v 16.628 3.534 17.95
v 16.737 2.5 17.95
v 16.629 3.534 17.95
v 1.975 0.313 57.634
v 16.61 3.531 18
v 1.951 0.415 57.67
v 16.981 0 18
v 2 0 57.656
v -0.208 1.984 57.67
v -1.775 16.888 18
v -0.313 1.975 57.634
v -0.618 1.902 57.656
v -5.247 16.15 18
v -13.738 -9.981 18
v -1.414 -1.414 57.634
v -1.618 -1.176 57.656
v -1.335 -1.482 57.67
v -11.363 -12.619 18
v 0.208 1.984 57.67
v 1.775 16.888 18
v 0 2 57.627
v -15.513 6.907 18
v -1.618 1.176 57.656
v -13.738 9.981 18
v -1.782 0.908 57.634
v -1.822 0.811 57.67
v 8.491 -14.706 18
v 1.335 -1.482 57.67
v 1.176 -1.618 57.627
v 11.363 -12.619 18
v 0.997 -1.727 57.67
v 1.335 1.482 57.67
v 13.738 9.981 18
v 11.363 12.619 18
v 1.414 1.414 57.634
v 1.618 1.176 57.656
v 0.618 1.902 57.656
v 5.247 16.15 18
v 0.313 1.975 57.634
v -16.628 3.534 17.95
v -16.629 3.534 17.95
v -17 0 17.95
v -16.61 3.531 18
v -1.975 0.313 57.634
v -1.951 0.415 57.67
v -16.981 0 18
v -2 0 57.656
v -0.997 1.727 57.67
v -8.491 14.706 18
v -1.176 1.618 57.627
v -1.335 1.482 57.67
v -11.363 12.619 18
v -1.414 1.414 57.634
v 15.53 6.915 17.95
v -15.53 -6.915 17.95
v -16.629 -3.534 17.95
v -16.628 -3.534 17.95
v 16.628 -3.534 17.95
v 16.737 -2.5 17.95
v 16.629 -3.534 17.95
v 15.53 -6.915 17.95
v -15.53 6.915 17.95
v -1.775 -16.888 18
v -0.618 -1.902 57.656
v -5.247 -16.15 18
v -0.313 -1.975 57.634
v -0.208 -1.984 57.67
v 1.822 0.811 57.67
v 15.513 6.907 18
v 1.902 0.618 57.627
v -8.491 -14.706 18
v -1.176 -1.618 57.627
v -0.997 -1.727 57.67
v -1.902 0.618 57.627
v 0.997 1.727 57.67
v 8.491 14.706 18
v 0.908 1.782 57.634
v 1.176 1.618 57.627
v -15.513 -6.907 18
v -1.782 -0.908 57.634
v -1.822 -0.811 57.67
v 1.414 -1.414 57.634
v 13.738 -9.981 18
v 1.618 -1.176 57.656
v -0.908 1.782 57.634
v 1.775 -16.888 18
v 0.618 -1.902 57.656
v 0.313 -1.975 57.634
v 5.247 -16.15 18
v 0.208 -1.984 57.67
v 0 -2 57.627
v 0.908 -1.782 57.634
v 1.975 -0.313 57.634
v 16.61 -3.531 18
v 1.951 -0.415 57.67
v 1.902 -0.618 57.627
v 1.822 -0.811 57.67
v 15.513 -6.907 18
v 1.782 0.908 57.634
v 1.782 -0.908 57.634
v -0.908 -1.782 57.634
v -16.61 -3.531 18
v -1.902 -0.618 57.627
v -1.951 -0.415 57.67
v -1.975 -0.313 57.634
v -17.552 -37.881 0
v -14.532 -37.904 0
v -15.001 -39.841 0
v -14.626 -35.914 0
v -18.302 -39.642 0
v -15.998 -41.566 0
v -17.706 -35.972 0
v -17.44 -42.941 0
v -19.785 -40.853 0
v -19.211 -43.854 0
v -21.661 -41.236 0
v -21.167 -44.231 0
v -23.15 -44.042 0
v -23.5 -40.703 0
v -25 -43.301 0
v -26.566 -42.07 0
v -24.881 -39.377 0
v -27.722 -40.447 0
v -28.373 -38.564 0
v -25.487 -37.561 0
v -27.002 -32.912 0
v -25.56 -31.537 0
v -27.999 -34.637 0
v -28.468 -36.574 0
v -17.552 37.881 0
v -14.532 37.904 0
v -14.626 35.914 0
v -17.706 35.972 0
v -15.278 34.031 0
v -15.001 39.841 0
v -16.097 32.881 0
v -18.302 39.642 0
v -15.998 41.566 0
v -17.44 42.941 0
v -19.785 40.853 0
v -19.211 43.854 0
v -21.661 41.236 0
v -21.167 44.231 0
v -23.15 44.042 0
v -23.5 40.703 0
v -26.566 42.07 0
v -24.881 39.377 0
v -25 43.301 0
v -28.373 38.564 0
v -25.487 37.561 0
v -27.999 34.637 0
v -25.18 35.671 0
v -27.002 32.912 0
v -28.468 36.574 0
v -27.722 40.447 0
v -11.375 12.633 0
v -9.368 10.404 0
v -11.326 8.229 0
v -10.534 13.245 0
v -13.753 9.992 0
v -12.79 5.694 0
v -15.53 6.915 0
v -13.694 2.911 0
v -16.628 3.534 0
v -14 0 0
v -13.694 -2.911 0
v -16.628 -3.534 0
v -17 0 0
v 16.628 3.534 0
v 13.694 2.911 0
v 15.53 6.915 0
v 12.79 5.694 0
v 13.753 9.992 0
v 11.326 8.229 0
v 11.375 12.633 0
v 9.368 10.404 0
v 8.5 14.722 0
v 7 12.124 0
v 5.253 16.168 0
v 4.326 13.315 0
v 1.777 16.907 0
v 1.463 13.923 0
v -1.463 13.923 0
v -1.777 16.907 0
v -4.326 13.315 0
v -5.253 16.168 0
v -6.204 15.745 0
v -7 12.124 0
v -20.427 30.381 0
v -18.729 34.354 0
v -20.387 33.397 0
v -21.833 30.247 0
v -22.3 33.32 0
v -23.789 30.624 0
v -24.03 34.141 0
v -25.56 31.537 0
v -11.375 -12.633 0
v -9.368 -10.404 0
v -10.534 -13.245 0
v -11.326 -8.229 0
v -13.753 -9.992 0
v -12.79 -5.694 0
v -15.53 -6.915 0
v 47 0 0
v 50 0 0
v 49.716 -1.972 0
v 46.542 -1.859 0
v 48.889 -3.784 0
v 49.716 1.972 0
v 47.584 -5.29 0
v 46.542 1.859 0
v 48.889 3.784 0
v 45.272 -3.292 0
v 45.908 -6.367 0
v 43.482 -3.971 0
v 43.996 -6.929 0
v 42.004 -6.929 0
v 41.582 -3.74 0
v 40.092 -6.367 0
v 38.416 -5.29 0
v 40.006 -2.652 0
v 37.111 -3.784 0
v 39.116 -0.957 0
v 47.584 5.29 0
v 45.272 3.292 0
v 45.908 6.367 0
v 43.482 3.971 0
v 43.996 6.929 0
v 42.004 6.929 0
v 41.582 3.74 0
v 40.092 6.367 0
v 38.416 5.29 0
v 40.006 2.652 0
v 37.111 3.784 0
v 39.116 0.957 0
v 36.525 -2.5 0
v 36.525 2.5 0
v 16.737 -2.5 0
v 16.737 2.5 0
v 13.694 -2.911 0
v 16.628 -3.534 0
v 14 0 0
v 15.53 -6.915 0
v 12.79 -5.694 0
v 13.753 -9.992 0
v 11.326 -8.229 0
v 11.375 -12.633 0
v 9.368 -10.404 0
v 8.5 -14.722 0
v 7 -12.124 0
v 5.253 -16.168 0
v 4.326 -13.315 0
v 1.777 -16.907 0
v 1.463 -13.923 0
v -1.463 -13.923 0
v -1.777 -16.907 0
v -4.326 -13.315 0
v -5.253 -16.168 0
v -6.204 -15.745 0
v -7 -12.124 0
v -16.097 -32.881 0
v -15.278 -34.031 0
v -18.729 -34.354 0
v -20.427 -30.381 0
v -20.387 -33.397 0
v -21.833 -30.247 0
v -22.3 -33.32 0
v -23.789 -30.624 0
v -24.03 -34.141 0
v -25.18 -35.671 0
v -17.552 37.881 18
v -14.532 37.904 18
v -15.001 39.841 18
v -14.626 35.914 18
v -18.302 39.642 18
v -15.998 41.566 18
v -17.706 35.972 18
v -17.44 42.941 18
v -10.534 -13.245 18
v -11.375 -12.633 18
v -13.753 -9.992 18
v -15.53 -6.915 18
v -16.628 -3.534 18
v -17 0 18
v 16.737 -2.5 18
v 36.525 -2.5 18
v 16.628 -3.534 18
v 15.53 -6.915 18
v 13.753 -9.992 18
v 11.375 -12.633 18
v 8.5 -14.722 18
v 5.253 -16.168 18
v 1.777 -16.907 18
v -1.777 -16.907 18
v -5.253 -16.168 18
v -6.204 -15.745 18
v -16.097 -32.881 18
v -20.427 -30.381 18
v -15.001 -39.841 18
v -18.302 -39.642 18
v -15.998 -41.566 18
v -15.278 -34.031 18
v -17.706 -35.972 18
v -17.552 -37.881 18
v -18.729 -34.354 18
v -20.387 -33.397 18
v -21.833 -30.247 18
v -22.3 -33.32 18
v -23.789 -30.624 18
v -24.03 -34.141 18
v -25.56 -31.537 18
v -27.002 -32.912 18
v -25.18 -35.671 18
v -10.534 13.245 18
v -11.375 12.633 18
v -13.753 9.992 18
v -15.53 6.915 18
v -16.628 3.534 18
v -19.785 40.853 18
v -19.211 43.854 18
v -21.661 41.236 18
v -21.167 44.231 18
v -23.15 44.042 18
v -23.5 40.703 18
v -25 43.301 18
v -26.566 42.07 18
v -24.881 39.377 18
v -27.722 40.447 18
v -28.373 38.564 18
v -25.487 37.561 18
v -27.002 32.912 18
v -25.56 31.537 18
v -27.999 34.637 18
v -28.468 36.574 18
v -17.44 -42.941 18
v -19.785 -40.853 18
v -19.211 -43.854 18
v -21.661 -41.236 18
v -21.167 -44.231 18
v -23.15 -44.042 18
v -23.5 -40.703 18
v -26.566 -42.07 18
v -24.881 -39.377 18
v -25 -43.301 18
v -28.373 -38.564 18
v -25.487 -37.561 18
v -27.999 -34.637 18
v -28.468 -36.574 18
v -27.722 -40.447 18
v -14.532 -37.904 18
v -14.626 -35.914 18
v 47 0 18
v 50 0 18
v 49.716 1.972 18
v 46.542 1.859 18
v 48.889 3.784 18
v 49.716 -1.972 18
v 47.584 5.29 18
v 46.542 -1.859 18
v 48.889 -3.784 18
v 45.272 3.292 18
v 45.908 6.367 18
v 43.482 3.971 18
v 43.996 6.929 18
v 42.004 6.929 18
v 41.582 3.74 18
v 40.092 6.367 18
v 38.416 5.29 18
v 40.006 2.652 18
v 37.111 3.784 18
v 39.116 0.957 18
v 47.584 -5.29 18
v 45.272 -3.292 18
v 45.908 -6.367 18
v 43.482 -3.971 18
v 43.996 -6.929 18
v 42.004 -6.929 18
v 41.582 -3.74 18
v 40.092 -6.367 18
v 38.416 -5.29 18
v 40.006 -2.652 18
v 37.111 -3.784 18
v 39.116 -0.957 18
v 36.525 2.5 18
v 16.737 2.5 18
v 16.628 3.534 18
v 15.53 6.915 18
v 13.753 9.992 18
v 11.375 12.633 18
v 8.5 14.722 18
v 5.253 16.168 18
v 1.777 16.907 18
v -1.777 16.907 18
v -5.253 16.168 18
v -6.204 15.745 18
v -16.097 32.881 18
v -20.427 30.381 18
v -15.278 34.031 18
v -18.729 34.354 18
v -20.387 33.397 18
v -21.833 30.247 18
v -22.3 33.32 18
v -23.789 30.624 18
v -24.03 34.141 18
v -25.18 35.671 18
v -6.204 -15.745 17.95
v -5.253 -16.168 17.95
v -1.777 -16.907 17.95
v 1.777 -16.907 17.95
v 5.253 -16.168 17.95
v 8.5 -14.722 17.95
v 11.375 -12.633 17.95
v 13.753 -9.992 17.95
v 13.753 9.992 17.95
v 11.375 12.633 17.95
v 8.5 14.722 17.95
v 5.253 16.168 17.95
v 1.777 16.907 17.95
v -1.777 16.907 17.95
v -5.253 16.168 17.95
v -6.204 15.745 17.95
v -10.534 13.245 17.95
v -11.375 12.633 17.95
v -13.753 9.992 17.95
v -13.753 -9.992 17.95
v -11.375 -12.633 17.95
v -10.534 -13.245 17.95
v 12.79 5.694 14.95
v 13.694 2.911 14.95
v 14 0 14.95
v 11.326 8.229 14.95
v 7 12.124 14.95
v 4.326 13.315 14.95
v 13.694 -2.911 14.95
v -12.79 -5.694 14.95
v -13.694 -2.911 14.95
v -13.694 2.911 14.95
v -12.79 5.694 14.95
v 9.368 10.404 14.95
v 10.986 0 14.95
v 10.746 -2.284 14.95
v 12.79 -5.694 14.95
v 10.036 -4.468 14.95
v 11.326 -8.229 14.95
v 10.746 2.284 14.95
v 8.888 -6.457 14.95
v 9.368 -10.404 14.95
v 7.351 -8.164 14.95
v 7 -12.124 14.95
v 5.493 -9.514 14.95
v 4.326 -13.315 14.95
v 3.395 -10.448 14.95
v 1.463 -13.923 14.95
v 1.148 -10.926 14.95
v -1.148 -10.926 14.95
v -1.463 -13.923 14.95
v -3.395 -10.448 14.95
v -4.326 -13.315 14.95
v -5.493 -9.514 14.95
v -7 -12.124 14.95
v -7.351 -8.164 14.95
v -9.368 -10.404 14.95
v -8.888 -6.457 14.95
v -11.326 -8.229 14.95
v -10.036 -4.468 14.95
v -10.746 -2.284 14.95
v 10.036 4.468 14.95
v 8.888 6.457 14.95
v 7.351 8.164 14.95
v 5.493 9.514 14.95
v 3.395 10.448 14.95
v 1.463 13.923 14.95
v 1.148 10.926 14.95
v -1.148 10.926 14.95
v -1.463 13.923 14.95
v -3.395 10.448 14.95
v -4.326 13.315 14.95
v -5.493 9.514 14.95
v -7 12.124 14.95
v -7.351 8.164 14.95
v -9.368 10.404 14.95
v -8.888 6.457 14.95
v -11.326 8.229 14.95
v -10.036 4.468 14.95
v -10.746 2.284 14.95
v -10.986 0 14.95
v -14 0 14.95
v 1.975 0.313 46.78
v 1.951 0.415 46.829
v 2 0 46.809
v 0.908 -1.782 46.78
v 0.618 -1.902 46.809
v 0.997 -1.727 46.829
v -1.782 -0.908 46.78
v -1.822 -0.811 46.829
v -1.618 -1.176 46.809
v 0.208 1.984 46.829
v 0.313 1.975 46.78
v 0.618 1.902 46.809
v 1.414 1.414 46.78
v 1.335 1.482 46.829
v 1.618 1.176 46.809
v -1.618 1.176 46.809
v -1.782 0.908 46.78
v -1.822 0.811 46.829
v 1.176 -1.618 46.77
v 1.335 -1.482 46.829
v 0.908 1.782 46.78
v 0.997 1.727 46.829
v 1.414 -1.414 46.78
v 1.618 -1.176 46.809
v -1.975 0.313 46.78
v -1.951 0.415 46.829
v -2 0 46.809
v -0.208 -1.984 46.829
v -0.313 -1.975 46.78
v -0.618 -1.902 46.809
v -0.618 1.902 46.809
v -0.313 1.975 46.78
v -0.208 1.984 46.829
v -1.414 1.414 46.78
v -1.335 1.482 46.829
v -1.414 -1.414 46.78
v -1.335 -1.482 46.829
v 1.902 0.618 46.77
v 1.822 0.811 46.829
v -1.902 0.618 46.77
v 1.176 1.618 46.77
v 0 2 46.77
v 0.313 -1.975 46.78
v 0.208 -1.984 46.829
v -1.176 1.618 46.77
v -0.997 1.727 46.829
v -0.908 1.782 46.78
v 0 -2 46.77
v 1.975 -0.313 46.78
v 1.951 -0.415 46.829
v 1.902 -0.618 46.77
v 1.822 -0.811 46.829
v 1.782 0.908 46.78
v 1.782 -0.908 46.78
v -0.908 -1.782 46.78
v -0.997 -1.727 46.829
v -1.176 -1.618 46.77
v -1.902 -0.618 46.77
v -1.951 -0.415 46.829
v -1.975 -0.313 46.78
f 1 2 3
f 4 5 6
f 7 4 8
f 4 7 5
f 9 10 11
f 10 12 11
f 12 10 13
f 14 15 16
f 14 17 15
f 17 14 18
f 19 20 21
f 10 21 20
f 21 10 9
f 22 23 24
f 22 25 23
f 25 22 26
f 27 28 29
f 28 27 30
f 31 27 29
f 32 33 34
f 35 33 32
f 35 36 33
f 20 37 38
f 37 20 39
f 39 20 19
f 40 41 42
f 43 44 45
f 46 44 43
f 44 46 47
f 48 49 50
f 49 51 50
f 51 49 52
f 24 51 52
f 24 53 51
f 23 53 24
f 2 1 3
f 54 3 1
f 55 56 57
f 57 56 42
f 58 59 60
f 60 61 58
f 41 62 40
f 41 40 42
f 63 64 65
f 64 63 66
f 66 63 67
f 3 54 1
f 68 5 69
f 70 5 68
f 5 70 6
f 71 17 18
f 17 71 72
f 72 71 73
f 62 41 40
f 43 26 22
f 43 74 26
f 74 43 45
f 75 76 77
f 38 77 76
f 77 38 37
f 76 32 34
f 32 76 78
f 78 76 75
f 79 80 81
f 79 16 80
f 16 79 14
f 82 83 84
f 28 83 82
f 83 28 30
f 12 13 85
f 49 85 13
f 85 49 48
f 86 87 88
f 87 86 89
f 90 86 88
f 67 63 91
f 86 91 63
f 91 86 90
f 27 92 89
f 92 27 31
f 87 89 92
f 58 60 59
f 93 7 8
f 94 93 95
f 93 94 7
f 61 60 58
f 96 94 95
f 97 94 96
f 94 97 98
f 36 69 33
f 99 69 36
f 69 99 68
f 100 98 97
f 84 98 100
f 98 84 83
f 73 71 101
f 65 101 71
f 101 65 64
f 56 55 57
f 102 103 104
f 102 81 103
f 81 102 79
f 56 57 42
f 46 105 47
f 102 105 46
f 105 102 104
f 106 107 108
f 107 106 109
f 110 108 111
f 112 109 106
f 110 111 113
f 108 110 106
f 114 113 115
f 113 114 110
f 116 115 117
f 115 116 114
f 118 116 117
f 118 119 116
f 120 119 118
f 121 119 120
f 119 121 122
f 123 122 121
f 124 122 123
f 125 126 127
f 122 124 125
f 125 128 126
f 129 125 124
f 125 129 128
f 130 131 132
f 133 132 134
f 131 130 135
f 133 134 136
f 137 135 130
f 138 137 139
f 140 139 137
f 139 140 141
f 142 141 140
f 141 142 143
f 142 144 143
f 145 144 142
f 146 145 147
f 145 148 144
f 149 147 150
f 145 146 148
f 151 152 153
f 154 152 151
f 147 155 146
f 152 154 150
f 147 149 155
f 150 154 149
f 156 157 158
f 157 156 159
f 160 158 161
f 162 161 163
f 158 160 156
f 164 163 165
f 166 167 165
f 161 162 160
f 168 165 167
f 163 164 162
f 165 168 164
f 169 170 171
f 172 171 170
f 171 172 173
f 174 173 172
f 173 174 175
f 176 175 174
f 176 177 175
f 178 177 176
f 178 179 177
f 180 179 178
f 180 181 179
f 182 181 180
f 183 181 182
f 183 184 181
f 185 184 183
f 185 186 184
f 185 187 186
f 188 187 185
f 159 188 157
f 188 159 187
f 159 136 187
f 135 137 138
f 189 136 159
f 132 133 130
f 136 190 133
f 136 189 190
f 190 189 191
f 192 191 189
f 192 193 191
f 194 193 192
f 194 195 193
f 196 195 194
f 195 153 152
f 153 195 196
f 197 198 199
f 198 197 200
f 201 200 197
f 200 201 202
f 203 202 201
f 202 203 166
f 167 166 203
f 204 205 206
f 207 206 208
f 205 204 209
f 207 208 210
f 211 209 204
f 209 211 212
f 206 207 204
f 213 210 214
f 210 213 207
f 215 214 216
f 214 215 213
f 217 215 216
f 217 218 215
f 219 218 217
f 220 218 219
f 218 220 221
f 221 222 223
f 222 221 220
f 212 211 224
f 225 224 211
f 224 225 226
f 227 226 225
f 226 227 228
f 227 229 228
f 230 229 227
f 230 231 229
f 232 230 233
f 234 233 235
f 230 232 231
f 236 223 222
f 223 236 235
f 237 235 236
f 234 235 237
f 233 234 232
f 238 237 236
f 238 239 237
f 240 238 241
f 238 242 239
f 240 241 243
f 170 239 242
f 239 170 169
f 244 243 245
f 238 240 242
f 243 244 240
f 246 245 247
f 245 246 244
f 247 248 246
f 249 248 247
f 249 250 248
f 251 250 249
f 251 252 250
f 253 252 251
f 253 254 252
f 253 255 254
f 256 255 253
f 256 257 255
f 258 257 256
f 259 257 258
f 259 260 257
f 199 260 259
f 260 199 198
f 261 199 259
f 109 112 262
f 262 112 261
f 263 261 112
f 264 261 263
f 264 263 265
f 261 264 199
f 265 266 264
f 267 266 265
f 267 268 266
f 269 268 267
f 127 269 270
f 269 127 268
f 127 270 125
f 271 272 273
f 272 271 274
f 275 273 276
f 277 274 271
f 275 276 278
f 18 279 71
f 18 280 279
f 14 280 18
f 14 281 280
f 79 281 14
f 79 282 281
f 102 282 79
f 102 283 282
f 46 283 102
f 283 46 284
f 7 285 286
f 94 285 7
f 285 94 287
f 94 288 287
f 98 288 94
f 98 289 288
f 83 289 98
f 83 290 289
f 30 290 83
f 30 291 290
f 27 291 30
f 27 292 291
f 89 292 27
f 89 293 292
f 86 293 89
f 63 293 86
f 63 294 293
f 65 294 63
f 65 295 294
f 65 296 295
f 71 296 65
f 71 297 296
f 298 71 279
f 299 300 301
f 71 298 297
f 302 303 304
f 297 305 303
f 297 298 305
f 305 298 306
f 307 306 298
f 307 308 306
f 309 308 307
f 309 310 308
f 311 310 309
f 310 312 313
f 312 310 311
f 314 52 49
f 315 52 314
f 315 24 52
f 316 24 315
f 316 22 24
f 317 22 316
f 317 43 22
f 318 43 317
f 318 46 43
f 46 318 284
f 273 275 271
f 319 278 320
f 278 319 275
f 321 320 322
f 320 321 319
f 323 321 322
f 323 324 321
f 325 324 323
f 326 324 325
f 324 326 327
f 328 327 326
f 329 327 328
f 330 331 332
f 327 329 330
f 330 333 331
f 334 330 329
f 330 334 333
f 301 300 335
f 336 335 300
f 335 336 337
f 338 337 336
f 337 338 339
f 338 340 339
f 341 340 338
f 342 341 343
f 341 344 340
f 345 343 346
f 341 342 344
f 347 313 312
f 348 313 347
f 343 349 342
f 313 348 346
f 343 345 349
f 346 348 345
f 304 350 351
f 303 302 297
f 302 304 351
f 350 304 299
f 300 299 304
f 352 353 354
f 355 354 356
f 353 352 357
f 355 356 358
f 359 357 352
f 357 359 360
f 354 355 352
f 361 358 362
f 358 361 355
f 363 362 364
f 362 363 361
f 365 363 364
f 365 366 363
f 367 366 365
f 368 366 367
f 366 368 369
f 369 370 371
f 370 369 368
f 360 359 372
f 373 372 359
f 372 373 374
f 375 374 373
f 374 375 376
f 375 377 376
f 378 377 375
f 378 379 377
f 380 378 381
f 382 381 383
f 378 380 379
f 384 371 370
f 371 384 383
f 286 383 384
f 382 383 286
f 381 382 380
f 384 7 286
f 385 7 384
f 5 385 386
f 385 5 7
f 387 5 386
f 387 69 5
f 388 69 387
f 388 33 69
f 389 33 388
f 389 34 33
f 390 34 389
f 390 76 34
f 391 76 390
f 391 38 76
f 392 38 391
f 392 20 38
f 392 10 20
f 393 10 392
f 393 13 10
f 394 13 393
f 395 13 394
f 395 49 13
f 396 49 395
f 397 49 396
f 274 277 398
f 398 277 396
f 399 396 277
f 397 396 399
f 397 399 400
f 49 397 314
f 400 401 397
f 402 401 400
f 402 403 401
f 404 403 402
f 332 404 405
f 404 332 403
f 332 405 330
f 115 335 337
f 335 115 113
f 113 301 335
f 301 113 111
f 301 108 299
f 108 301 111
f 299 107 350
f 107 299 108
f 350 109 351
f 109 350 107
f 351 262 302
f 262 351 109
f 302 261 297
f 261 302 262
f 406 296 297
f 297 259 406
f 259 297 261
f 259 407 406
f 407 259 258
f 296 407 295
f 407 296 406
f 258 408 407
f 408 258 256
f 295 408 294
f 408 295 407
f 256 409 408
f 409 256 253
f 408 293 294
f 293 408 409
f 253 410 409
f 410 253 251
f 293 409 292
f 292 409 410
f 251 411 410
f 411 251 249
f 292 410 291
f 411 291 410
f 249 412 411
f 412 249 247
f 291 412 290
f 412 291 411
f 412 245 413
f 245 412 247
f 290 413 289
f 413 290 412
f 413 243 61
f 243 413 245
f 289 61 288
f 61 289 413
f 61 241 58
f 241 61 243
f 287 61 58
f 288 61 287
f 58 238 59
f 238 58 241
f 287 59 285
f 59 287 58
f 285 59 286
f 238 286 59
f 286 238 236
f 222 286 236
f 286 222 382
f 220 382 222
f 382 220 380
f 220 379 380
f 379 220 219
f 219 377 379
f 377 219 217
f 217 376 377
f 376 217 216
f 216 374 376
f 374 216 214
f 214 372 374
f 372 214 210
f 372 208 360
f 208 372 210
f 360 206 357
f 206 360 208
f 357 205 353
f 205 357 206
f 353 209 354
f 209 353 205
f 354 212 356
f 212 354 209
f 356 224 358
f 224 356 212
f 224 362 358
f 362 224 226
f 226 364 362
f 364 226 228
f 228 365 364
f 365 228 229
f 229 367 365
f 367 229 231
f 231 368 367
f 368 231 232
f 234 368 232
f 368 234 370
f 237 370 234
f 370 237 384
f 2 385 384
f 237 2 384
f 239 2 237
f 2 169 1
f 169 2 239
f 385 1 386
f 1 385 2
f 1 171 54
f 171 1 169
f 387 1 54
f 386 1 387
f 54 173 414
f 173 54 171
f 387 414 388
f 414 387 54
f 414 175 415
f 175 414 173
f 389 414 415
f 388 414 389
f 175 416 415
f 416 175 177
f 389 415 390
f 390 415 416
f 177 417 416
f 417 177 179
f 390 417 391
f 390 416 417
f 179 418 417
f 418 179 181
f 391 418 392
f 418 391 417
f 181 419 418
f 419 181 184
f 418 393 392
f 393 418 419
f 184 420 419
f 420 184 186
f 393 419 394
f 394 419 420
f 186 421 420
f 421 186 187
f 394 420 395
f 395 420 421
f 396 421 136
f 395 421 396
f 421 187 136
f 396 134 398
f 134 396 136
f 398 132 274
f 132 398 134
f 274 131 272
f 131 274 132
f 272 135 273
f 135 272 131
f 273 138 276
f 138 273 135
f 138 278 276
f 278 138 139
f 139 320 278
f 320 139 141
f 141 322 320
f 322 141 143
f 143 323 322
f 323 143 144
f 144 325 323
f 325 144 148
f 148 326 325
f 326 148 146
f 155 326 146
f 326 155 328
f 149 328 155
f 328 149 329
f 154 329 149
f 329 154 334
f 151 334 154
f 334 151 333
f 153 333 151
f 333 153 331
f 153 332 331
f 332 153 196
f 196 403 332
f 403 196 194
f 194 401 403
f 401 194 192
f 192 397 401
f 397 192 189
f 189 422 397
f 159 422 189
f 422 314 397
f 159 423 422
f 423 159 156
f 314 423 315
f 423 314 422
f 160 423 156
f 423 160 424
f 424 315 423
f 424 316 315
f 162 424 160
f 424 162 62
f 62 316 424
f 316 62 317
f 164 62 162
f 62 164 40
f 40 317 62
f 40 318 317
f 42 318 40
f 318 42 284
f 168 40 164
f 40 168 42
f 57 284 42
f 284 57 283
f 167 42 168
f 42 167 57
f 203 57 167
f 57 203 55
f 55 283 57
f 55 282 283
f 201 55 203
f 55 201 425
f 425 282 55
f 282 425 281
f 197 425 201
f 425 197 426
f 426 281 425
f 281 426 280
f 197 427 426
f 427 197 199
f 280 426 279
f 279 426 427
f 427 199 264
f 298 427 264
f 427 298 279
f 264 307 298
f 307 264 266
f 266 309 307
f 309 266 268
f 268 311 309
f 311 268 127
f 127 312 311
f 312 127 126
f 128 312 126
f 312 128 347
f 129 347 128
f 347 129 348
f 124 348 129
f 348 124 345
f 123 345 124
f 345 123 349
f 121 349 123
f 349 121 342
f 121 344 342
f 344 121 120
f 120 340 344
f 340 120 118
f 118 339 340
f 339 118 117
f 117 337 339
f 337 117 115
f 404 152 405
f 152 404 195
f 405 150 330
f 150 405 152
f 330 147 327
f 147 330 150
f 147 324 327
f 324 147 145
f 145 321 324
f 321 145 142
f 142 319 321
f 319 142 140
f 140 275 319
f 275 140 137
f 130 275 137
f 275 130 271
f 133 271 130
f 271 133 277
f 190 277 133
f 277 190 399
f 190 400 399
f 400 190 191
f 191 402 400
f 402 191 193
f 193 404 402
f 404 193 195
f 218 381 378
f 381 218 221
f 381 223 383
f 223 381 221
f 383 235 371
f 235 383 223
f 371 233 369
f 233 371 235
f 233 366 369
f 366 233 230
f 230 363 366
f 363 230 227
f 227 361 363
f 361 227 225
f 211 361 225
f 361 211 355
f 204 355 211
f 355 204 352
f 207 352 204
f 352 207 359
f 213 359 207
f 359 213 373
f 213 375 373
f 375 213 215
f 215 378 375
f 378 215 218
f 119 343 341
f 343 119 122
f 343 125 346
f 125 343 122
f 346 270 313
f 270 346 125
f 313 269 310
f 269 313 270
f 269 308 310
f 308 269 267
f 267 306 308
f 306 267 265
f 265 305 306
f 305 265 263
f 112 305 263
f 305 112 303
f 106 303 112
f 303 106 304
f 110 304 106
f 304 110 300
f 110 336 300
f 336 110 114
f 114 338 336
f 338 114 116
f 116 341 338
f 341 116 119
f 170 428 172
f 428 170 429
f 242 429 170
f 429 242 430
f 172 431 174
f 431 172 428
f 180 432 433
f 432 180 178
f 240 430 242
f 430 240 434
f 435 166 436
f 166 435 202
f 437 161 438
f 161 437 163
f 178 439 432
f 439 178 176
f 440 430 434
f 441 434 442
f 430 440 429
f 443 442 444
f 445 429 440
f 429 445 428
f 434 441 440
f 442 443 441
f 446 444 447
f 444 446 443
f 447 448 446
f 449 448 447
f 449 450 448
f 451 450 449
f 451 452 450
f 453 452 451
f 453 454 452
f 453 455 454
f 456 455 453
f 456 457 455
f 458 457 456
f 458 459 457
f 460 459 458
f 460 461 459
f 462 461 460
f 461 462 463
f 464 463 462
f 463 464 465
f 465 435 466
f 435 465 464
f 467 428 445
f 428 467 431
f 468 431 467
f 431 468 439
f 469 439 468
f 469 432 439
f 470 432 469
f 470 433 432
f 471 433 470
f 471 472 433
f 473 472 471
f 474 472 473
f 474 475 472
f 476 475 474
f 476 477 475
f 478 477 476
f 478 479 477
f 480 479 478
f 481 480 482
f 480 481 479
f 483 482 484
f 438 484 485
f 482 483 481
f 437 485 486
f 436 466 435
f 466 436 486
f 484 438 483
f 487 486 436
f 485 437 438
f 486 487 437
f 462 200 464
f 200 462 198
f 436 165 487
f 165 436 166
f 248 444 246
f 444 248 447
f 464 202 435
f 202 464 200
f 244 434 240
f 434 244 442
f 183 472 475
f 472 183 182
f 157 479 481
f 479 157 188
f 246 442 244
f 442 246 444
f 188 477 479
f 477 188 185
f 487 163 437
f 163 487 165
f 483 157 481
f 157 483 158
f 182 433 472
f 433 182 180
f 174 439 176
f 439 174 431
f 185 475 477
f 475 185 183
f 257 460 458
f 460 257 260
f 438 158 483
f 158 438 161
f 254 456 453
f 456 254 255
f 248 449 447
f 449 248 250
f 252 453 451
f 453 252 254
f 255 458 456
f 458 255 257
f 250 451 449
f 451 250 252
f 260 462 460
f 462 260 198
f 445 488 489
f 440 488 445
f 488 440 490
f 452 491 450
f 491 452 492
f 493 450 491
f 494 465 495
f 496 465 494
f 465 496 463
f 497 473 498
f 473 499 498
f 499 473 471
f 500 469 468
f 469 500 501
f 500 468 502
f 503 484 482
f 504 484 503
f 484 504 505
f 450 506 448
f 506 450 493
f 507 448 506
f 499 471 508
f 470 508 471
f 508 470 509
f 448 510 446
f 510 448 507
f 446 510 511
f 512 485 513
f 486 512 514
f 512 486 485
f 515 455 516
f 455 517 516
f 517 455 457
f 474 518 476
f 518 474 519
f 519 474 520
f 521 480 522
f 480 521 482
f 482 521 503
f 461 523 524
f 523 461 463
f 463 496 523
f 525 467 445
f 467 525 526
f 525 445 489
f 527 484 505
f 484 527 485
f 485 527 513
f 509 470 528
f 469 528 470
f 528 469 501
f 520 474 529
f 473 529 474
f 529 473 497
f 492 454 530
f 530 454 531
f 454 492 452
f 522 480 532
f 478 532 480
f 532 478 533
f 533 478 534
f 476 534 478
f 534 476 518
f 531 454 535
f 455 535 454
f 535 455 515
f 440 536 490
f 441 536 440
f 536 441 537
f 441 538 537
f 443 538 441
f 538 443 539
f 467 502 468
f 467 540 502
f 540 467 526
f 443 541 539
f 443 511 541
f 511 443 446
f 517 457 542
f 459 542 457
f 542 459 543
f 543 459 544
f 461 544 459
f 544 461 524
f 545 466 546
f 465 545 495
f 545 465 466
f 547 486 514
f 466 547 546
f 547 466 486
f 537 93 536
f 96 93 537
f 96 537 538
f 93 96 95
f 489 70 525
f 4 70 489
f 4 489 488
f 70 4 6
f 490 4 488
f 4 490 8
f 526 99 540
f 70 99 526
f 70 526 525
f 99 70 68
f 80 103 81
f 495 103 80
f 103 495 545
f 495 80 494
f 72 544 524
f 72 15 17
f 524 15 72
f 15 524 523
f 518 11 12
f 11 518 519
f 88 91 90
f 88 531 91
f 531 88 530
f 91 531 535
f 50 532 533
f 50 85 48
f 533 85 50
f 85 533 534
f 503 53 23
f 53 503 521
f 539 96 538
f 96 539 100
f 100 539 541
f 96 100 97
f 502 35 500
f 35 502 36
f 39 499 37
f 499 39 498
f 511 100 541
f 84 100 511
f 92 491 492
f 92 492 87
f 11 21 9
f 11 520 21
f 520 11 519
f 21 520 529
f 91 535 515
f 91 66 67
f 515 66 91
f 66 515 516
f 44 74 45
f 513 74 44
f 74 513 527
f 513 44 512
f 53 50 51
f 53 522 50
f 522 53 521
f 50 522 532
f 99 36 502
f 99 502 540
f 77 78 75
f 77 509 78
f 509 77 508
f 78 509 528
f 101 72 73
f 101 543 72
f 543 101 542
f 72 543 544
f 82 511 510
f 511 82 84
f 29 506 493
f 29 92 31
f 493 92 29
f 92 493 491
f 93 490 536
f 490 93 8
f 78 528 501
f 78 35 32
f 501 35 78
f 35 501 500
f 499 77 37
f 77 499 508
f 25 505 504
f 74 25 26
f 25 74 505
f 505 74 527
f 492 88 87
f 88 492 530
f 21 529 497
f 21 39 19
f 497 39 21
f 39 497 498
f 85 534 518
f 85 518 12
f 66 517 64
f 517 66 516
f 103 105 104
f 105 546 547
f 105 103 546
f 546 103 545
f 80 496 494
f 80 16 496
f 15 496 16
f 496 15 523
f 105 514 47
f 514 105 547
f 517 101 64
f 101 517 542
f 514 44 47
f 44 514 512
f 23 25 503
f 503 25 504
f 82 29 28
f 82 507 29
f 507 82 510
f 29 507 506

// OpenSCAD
//Watering For soda bottle
//Ari Diacou
//March 2017
/*/////////////////////// Instructions ////////////////////////////
This automatic waterer uses bottle with a screw on cap. The cap is glued into the base, and then a hole is popped in the cap (with a drill or nail) the base is nailed into the ground near one of your plants. The bottle is filled with water, and then screwed in upside down into the cap. 
1. Take measurements of the cap height, cap diameter, and landscaping nail diameter. Puch those into Customizer/OpenSCAD file.
2. Render/Export.
3. Print with supports. You should only need them for the overhang for the cap.
4. Remove supports.
5. With a nail or drill bit, make a hole in the cap of your bottle.
6. Place glue (anything waterproof: Wood Glue, silicone caulk, Goop, superglue gel, PVC pipe cement, avoid: white/PVA/school glue, gorilla glue, might work: tacky glue, contact cement) on sides of cap, base overhang (not in the funnel), and on sides of the cap recess in the base.
7. Place cap into the base, swirl around so you have an even distribution of glue in the gap between the cap and the base. Wipe away excess glue with a damp paper towel/napkin/tissue.
8. Turn upside down onto some Saran wrap or aluminum foil, wipe away excess glue with a damp paper towel/napkin/tissue, and allow the glue to cure per manufacturers instructions.
9. Remove the base from your drying sheet.
10. Place the base, cone side down, near the plant you want to water. It should be close enough to the plant, that the water will go to the roots, but far enough away that you can (un)screw the bottle from the base without interfering with the plant as it grows.
11. Fit the landscaping nails into the holes in the nacelles, and happer them into the ground, making sure the base is level.
12. Fill the bottle with water.
13. Turn the bottle over and screw it into the base.

FAQ/Troubleshooting:
1. How does it work? As the soil dries out, water from the bottle will displace air in the soil, and water the soil. When the soil is saturated, there will be no air to bubble up the bottle and displace water in the bottle. If the seal between the bottle and the cap is air tight, this should keep the soil at a constant moisture.
2. It's not working, no water is coming out. Either you forgot to tap a hole in the cap, or glue clogged the funnel. Drill a hole from the cap to the tip.
3. It's not working, there is a small wet patch, but the plant isn't getting it. Your plant could be too far away (>12”), the hole in your cap could be too small, or your soil has too much clay in it.
4. Water spills out the top of the base. The seal between the cap and the bottle is not good enough. Try screwing it down a bit more, maybe there is some dirt at the bottom of the cap, that prevents a good seal. Maybe your cap has cracked or deformed.
5. I don't drink liquor or soda, because I am a wino. How can I get this to work? I cant help you if you drink boxed wine (although BotaBox is better than Franzia). For wine bottles, maybe try to increase the “cap_height” to somehting like 3 inches. Measure the width of the bottle at this distance down the neck, add 2-4 mm to this. Set this number to the “cap diameter”. Print the base per steps 1-4. Coat the top of the bottle and the neck with Silicone caulk to create a waterproof O-ring. Allow to dry seperately from the base. Once dry, using a very sharp utility knife, cut away excess silicone so that the bottle makes a perfect flat seal with the base. The water will leak out if the bottle gets tilted, allowing air into the base.
6. It's august, my cap is leaking, and it looks all deformed, what happened? You were probably using PLA, not ABS. PLA deforms at a relatively low temperature.

*///////////////////////// Parameters //////////////////////////////
// preview[view:east, tilt:bottom]

//Measure the diameter of the cap of the bottle you will be using
real_cap_diameter=25;
//Measure the height of the cap you will be using
cap_height=15;
//Measure the ones you bought
diameter_of_landscaping_nails=8;
//How wide do you want this to be?
wingspan=100;
//The width of the wings that attach the "nacelles" to the central hub
wing_width=5;
//The thickness of the hub and the nacelles
wall_thickness=3;
//is the number of landscaping spikes that will secure the base
number_of_wings=3;
//The hole for the cap is this much bigger than the cap, to allow for glue volume
tolerance_for_glue=3;
//The hole in the tip that allows the water to flow into the soil
drip_hole_diameter=4;

///////////////////// Derived Parameters //////////////////////////
ep=0.05+0;
cap_diameter=real_cap_diameter+tolerance_for_glue;
base_height=cap_height+wall_thickness;
nacelle_width=diameter_of_landscaping_nails+2*wall_thickness;
hub_diameter=cap_diameter+2*wall_thickness;
wing_length=wingspan/2-nacelle_width/2;
tip_depth=base_height*2.5;
////////////////////////// Main() /////////////////////////////////
difference(){
    union(){
        tip();
        linear_extrude(base_height)
            base();
        }
    hollow();
    }
    
//////////////////////// Functions ////////////////////////////////
module base(){
    circle(d=hub_diameter);
    for(i=[0:number_of_wings-1])
        rotate([0,0,i*360/number_of_wings]) wing();
    }
    
module hollow(){
    translate([0,0,-ep])
        cylinder(d=cap_diameter,h=cap_height);
    translate([0,0,cap_height-2*ep]) 
        cylinder(d1=cap_diameter-2*wall_thickness,d2=0,h=tip_depth-2*wall_thickness);
    cylinder(d=drip_hole_diameter,h=1.01*(tip_depth+base_height),$fn=40);
    }
    
module tip(){
    translate([0,0,base_height-ep]) 
        cylinder(d1=hub_diameter,d2=0,h=tip_depth);
    }    

module wing(){
        difference(){
            union(){
                translate([0,-wing_width/2]) 
                    square([wing_length,wing_width]);
                translate([wing_length,0]) 
                    circle(d=nacelle_width);
                }
            translate([wing_length,0]) circle(d=diameter_of_landscaping_nails);
            }
    }
